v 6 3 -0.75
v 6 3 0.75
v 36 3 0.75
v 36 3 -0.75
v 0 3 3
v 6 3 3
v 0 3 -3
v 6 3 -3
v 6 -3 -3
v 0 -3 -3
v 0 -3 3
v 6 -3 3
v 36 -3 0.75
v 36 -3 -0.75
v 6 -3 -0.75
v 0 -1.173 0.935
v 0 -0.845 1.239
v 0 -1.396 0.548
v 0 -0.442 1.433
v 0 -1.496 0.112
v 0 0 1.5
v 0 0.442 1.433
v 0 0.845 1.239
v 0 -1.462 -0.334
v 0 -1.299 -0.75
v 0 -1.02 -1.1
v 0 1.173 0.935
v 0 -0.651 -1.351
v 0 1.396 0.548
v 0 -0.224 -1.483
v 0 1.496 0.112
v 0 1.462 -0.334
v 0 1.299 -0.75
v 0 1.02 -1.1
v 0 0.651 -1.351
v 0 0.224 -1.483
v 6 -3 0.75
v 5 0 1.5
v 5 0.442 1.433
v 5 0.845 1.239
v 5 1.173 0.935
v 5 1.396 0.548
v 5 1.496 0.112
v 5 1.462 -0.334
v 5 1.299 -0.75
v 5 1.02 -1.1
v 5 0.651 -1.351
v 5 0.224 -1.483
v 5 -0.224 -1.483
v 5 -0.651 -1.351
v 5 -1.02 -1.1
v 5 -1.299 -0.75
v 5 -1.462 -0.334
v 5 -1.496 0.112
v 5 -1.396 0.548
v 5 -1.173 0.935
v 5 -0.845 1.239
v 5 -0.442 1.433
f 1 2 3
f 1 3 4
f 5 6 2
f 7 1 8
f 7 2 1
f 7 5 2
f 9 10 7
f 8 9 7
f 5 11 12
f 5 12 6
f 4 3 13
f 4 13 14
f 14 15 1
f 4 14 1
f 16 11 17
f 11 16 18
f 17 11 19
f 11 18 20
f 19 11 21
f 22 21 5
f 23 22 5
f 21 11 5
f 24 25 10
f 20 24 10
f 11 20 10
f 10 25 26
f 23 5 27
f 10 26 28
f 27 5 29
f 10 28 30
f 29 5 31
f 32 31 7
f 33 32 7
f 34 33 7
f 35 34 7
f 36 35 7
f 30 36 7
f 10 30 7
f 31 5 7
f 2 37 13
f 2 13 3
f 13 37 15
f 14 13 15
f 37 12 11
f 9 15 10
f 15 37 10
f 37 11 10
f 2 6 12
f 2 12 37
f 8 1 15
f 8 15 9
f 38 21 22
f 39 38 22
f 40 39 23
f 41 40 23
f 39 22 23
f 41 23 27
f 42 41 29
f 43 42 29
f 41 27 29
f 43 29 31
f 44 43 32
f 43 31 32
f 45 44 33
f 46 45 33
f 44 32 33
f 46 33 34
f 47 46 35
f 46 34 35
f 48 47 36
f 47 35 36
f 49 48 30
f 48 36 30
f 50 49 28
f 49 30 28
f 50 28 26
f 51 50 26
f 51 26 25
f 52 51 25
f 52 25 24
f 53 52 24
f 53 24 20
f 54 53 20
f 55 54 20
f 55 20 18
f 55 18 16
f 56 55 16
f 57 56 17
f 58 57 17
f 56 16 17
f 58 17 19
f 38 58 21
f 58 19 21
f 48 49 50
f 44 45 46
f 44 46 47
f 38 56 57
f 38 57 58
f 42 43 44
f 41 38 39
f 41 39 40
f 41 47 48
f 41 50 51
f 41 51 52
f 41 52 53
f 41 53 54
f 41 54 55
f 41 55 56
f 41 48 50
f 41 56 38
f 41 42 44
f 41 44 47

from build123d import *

# Parameters (mm, degrees)
SKETCH1_W           = 6
SKETCH1_H           = 6
BOSS_EXTRUDE1_DEPTH = 6
SKETCH2_W           = 1.5
SKETCH2_H           = 6
BOSS_EXTRUDE2_DEPTH = 30
SKETCH3_R           = 1.5
CUT_EXTRUDE1_DEPTH  = 5


with BuildPart() as part:
    # Sketch1 → Boss-Extrude1 (new body)
    with BuildSketch(Plane(origin=(0, 0, 0), x_dir=(0, 0, -1), z_dir=(1, 0, 0))):
        Rectangle(SKETCH1_W, SKETCH1_H)
    extrude(amount=BOSS_EXTRUDE1_DEPTH)

    # Sketch2 → Boss-Extrude2 (add)
    with BuildSketch(Plane(origin=(6, 0, 0), x_dir=(0, 0, -1), z_dir=(1, 0, 0))):
        Rectangle(SKETCH2_W, SKETCH2_H)
    extrude(amount=BOSS_EXTRUDE2_DEPTH)

    # Sketch3 → Cut-Extrude1 (cut)
    with BuildSketch(Plane.ZY):
        Circle(SKETCH3_R)
    extrude(amount=-CUT_EXTRUDE1_DEPTH, mode=Mode.SUBTRACT)


solid = part.part
